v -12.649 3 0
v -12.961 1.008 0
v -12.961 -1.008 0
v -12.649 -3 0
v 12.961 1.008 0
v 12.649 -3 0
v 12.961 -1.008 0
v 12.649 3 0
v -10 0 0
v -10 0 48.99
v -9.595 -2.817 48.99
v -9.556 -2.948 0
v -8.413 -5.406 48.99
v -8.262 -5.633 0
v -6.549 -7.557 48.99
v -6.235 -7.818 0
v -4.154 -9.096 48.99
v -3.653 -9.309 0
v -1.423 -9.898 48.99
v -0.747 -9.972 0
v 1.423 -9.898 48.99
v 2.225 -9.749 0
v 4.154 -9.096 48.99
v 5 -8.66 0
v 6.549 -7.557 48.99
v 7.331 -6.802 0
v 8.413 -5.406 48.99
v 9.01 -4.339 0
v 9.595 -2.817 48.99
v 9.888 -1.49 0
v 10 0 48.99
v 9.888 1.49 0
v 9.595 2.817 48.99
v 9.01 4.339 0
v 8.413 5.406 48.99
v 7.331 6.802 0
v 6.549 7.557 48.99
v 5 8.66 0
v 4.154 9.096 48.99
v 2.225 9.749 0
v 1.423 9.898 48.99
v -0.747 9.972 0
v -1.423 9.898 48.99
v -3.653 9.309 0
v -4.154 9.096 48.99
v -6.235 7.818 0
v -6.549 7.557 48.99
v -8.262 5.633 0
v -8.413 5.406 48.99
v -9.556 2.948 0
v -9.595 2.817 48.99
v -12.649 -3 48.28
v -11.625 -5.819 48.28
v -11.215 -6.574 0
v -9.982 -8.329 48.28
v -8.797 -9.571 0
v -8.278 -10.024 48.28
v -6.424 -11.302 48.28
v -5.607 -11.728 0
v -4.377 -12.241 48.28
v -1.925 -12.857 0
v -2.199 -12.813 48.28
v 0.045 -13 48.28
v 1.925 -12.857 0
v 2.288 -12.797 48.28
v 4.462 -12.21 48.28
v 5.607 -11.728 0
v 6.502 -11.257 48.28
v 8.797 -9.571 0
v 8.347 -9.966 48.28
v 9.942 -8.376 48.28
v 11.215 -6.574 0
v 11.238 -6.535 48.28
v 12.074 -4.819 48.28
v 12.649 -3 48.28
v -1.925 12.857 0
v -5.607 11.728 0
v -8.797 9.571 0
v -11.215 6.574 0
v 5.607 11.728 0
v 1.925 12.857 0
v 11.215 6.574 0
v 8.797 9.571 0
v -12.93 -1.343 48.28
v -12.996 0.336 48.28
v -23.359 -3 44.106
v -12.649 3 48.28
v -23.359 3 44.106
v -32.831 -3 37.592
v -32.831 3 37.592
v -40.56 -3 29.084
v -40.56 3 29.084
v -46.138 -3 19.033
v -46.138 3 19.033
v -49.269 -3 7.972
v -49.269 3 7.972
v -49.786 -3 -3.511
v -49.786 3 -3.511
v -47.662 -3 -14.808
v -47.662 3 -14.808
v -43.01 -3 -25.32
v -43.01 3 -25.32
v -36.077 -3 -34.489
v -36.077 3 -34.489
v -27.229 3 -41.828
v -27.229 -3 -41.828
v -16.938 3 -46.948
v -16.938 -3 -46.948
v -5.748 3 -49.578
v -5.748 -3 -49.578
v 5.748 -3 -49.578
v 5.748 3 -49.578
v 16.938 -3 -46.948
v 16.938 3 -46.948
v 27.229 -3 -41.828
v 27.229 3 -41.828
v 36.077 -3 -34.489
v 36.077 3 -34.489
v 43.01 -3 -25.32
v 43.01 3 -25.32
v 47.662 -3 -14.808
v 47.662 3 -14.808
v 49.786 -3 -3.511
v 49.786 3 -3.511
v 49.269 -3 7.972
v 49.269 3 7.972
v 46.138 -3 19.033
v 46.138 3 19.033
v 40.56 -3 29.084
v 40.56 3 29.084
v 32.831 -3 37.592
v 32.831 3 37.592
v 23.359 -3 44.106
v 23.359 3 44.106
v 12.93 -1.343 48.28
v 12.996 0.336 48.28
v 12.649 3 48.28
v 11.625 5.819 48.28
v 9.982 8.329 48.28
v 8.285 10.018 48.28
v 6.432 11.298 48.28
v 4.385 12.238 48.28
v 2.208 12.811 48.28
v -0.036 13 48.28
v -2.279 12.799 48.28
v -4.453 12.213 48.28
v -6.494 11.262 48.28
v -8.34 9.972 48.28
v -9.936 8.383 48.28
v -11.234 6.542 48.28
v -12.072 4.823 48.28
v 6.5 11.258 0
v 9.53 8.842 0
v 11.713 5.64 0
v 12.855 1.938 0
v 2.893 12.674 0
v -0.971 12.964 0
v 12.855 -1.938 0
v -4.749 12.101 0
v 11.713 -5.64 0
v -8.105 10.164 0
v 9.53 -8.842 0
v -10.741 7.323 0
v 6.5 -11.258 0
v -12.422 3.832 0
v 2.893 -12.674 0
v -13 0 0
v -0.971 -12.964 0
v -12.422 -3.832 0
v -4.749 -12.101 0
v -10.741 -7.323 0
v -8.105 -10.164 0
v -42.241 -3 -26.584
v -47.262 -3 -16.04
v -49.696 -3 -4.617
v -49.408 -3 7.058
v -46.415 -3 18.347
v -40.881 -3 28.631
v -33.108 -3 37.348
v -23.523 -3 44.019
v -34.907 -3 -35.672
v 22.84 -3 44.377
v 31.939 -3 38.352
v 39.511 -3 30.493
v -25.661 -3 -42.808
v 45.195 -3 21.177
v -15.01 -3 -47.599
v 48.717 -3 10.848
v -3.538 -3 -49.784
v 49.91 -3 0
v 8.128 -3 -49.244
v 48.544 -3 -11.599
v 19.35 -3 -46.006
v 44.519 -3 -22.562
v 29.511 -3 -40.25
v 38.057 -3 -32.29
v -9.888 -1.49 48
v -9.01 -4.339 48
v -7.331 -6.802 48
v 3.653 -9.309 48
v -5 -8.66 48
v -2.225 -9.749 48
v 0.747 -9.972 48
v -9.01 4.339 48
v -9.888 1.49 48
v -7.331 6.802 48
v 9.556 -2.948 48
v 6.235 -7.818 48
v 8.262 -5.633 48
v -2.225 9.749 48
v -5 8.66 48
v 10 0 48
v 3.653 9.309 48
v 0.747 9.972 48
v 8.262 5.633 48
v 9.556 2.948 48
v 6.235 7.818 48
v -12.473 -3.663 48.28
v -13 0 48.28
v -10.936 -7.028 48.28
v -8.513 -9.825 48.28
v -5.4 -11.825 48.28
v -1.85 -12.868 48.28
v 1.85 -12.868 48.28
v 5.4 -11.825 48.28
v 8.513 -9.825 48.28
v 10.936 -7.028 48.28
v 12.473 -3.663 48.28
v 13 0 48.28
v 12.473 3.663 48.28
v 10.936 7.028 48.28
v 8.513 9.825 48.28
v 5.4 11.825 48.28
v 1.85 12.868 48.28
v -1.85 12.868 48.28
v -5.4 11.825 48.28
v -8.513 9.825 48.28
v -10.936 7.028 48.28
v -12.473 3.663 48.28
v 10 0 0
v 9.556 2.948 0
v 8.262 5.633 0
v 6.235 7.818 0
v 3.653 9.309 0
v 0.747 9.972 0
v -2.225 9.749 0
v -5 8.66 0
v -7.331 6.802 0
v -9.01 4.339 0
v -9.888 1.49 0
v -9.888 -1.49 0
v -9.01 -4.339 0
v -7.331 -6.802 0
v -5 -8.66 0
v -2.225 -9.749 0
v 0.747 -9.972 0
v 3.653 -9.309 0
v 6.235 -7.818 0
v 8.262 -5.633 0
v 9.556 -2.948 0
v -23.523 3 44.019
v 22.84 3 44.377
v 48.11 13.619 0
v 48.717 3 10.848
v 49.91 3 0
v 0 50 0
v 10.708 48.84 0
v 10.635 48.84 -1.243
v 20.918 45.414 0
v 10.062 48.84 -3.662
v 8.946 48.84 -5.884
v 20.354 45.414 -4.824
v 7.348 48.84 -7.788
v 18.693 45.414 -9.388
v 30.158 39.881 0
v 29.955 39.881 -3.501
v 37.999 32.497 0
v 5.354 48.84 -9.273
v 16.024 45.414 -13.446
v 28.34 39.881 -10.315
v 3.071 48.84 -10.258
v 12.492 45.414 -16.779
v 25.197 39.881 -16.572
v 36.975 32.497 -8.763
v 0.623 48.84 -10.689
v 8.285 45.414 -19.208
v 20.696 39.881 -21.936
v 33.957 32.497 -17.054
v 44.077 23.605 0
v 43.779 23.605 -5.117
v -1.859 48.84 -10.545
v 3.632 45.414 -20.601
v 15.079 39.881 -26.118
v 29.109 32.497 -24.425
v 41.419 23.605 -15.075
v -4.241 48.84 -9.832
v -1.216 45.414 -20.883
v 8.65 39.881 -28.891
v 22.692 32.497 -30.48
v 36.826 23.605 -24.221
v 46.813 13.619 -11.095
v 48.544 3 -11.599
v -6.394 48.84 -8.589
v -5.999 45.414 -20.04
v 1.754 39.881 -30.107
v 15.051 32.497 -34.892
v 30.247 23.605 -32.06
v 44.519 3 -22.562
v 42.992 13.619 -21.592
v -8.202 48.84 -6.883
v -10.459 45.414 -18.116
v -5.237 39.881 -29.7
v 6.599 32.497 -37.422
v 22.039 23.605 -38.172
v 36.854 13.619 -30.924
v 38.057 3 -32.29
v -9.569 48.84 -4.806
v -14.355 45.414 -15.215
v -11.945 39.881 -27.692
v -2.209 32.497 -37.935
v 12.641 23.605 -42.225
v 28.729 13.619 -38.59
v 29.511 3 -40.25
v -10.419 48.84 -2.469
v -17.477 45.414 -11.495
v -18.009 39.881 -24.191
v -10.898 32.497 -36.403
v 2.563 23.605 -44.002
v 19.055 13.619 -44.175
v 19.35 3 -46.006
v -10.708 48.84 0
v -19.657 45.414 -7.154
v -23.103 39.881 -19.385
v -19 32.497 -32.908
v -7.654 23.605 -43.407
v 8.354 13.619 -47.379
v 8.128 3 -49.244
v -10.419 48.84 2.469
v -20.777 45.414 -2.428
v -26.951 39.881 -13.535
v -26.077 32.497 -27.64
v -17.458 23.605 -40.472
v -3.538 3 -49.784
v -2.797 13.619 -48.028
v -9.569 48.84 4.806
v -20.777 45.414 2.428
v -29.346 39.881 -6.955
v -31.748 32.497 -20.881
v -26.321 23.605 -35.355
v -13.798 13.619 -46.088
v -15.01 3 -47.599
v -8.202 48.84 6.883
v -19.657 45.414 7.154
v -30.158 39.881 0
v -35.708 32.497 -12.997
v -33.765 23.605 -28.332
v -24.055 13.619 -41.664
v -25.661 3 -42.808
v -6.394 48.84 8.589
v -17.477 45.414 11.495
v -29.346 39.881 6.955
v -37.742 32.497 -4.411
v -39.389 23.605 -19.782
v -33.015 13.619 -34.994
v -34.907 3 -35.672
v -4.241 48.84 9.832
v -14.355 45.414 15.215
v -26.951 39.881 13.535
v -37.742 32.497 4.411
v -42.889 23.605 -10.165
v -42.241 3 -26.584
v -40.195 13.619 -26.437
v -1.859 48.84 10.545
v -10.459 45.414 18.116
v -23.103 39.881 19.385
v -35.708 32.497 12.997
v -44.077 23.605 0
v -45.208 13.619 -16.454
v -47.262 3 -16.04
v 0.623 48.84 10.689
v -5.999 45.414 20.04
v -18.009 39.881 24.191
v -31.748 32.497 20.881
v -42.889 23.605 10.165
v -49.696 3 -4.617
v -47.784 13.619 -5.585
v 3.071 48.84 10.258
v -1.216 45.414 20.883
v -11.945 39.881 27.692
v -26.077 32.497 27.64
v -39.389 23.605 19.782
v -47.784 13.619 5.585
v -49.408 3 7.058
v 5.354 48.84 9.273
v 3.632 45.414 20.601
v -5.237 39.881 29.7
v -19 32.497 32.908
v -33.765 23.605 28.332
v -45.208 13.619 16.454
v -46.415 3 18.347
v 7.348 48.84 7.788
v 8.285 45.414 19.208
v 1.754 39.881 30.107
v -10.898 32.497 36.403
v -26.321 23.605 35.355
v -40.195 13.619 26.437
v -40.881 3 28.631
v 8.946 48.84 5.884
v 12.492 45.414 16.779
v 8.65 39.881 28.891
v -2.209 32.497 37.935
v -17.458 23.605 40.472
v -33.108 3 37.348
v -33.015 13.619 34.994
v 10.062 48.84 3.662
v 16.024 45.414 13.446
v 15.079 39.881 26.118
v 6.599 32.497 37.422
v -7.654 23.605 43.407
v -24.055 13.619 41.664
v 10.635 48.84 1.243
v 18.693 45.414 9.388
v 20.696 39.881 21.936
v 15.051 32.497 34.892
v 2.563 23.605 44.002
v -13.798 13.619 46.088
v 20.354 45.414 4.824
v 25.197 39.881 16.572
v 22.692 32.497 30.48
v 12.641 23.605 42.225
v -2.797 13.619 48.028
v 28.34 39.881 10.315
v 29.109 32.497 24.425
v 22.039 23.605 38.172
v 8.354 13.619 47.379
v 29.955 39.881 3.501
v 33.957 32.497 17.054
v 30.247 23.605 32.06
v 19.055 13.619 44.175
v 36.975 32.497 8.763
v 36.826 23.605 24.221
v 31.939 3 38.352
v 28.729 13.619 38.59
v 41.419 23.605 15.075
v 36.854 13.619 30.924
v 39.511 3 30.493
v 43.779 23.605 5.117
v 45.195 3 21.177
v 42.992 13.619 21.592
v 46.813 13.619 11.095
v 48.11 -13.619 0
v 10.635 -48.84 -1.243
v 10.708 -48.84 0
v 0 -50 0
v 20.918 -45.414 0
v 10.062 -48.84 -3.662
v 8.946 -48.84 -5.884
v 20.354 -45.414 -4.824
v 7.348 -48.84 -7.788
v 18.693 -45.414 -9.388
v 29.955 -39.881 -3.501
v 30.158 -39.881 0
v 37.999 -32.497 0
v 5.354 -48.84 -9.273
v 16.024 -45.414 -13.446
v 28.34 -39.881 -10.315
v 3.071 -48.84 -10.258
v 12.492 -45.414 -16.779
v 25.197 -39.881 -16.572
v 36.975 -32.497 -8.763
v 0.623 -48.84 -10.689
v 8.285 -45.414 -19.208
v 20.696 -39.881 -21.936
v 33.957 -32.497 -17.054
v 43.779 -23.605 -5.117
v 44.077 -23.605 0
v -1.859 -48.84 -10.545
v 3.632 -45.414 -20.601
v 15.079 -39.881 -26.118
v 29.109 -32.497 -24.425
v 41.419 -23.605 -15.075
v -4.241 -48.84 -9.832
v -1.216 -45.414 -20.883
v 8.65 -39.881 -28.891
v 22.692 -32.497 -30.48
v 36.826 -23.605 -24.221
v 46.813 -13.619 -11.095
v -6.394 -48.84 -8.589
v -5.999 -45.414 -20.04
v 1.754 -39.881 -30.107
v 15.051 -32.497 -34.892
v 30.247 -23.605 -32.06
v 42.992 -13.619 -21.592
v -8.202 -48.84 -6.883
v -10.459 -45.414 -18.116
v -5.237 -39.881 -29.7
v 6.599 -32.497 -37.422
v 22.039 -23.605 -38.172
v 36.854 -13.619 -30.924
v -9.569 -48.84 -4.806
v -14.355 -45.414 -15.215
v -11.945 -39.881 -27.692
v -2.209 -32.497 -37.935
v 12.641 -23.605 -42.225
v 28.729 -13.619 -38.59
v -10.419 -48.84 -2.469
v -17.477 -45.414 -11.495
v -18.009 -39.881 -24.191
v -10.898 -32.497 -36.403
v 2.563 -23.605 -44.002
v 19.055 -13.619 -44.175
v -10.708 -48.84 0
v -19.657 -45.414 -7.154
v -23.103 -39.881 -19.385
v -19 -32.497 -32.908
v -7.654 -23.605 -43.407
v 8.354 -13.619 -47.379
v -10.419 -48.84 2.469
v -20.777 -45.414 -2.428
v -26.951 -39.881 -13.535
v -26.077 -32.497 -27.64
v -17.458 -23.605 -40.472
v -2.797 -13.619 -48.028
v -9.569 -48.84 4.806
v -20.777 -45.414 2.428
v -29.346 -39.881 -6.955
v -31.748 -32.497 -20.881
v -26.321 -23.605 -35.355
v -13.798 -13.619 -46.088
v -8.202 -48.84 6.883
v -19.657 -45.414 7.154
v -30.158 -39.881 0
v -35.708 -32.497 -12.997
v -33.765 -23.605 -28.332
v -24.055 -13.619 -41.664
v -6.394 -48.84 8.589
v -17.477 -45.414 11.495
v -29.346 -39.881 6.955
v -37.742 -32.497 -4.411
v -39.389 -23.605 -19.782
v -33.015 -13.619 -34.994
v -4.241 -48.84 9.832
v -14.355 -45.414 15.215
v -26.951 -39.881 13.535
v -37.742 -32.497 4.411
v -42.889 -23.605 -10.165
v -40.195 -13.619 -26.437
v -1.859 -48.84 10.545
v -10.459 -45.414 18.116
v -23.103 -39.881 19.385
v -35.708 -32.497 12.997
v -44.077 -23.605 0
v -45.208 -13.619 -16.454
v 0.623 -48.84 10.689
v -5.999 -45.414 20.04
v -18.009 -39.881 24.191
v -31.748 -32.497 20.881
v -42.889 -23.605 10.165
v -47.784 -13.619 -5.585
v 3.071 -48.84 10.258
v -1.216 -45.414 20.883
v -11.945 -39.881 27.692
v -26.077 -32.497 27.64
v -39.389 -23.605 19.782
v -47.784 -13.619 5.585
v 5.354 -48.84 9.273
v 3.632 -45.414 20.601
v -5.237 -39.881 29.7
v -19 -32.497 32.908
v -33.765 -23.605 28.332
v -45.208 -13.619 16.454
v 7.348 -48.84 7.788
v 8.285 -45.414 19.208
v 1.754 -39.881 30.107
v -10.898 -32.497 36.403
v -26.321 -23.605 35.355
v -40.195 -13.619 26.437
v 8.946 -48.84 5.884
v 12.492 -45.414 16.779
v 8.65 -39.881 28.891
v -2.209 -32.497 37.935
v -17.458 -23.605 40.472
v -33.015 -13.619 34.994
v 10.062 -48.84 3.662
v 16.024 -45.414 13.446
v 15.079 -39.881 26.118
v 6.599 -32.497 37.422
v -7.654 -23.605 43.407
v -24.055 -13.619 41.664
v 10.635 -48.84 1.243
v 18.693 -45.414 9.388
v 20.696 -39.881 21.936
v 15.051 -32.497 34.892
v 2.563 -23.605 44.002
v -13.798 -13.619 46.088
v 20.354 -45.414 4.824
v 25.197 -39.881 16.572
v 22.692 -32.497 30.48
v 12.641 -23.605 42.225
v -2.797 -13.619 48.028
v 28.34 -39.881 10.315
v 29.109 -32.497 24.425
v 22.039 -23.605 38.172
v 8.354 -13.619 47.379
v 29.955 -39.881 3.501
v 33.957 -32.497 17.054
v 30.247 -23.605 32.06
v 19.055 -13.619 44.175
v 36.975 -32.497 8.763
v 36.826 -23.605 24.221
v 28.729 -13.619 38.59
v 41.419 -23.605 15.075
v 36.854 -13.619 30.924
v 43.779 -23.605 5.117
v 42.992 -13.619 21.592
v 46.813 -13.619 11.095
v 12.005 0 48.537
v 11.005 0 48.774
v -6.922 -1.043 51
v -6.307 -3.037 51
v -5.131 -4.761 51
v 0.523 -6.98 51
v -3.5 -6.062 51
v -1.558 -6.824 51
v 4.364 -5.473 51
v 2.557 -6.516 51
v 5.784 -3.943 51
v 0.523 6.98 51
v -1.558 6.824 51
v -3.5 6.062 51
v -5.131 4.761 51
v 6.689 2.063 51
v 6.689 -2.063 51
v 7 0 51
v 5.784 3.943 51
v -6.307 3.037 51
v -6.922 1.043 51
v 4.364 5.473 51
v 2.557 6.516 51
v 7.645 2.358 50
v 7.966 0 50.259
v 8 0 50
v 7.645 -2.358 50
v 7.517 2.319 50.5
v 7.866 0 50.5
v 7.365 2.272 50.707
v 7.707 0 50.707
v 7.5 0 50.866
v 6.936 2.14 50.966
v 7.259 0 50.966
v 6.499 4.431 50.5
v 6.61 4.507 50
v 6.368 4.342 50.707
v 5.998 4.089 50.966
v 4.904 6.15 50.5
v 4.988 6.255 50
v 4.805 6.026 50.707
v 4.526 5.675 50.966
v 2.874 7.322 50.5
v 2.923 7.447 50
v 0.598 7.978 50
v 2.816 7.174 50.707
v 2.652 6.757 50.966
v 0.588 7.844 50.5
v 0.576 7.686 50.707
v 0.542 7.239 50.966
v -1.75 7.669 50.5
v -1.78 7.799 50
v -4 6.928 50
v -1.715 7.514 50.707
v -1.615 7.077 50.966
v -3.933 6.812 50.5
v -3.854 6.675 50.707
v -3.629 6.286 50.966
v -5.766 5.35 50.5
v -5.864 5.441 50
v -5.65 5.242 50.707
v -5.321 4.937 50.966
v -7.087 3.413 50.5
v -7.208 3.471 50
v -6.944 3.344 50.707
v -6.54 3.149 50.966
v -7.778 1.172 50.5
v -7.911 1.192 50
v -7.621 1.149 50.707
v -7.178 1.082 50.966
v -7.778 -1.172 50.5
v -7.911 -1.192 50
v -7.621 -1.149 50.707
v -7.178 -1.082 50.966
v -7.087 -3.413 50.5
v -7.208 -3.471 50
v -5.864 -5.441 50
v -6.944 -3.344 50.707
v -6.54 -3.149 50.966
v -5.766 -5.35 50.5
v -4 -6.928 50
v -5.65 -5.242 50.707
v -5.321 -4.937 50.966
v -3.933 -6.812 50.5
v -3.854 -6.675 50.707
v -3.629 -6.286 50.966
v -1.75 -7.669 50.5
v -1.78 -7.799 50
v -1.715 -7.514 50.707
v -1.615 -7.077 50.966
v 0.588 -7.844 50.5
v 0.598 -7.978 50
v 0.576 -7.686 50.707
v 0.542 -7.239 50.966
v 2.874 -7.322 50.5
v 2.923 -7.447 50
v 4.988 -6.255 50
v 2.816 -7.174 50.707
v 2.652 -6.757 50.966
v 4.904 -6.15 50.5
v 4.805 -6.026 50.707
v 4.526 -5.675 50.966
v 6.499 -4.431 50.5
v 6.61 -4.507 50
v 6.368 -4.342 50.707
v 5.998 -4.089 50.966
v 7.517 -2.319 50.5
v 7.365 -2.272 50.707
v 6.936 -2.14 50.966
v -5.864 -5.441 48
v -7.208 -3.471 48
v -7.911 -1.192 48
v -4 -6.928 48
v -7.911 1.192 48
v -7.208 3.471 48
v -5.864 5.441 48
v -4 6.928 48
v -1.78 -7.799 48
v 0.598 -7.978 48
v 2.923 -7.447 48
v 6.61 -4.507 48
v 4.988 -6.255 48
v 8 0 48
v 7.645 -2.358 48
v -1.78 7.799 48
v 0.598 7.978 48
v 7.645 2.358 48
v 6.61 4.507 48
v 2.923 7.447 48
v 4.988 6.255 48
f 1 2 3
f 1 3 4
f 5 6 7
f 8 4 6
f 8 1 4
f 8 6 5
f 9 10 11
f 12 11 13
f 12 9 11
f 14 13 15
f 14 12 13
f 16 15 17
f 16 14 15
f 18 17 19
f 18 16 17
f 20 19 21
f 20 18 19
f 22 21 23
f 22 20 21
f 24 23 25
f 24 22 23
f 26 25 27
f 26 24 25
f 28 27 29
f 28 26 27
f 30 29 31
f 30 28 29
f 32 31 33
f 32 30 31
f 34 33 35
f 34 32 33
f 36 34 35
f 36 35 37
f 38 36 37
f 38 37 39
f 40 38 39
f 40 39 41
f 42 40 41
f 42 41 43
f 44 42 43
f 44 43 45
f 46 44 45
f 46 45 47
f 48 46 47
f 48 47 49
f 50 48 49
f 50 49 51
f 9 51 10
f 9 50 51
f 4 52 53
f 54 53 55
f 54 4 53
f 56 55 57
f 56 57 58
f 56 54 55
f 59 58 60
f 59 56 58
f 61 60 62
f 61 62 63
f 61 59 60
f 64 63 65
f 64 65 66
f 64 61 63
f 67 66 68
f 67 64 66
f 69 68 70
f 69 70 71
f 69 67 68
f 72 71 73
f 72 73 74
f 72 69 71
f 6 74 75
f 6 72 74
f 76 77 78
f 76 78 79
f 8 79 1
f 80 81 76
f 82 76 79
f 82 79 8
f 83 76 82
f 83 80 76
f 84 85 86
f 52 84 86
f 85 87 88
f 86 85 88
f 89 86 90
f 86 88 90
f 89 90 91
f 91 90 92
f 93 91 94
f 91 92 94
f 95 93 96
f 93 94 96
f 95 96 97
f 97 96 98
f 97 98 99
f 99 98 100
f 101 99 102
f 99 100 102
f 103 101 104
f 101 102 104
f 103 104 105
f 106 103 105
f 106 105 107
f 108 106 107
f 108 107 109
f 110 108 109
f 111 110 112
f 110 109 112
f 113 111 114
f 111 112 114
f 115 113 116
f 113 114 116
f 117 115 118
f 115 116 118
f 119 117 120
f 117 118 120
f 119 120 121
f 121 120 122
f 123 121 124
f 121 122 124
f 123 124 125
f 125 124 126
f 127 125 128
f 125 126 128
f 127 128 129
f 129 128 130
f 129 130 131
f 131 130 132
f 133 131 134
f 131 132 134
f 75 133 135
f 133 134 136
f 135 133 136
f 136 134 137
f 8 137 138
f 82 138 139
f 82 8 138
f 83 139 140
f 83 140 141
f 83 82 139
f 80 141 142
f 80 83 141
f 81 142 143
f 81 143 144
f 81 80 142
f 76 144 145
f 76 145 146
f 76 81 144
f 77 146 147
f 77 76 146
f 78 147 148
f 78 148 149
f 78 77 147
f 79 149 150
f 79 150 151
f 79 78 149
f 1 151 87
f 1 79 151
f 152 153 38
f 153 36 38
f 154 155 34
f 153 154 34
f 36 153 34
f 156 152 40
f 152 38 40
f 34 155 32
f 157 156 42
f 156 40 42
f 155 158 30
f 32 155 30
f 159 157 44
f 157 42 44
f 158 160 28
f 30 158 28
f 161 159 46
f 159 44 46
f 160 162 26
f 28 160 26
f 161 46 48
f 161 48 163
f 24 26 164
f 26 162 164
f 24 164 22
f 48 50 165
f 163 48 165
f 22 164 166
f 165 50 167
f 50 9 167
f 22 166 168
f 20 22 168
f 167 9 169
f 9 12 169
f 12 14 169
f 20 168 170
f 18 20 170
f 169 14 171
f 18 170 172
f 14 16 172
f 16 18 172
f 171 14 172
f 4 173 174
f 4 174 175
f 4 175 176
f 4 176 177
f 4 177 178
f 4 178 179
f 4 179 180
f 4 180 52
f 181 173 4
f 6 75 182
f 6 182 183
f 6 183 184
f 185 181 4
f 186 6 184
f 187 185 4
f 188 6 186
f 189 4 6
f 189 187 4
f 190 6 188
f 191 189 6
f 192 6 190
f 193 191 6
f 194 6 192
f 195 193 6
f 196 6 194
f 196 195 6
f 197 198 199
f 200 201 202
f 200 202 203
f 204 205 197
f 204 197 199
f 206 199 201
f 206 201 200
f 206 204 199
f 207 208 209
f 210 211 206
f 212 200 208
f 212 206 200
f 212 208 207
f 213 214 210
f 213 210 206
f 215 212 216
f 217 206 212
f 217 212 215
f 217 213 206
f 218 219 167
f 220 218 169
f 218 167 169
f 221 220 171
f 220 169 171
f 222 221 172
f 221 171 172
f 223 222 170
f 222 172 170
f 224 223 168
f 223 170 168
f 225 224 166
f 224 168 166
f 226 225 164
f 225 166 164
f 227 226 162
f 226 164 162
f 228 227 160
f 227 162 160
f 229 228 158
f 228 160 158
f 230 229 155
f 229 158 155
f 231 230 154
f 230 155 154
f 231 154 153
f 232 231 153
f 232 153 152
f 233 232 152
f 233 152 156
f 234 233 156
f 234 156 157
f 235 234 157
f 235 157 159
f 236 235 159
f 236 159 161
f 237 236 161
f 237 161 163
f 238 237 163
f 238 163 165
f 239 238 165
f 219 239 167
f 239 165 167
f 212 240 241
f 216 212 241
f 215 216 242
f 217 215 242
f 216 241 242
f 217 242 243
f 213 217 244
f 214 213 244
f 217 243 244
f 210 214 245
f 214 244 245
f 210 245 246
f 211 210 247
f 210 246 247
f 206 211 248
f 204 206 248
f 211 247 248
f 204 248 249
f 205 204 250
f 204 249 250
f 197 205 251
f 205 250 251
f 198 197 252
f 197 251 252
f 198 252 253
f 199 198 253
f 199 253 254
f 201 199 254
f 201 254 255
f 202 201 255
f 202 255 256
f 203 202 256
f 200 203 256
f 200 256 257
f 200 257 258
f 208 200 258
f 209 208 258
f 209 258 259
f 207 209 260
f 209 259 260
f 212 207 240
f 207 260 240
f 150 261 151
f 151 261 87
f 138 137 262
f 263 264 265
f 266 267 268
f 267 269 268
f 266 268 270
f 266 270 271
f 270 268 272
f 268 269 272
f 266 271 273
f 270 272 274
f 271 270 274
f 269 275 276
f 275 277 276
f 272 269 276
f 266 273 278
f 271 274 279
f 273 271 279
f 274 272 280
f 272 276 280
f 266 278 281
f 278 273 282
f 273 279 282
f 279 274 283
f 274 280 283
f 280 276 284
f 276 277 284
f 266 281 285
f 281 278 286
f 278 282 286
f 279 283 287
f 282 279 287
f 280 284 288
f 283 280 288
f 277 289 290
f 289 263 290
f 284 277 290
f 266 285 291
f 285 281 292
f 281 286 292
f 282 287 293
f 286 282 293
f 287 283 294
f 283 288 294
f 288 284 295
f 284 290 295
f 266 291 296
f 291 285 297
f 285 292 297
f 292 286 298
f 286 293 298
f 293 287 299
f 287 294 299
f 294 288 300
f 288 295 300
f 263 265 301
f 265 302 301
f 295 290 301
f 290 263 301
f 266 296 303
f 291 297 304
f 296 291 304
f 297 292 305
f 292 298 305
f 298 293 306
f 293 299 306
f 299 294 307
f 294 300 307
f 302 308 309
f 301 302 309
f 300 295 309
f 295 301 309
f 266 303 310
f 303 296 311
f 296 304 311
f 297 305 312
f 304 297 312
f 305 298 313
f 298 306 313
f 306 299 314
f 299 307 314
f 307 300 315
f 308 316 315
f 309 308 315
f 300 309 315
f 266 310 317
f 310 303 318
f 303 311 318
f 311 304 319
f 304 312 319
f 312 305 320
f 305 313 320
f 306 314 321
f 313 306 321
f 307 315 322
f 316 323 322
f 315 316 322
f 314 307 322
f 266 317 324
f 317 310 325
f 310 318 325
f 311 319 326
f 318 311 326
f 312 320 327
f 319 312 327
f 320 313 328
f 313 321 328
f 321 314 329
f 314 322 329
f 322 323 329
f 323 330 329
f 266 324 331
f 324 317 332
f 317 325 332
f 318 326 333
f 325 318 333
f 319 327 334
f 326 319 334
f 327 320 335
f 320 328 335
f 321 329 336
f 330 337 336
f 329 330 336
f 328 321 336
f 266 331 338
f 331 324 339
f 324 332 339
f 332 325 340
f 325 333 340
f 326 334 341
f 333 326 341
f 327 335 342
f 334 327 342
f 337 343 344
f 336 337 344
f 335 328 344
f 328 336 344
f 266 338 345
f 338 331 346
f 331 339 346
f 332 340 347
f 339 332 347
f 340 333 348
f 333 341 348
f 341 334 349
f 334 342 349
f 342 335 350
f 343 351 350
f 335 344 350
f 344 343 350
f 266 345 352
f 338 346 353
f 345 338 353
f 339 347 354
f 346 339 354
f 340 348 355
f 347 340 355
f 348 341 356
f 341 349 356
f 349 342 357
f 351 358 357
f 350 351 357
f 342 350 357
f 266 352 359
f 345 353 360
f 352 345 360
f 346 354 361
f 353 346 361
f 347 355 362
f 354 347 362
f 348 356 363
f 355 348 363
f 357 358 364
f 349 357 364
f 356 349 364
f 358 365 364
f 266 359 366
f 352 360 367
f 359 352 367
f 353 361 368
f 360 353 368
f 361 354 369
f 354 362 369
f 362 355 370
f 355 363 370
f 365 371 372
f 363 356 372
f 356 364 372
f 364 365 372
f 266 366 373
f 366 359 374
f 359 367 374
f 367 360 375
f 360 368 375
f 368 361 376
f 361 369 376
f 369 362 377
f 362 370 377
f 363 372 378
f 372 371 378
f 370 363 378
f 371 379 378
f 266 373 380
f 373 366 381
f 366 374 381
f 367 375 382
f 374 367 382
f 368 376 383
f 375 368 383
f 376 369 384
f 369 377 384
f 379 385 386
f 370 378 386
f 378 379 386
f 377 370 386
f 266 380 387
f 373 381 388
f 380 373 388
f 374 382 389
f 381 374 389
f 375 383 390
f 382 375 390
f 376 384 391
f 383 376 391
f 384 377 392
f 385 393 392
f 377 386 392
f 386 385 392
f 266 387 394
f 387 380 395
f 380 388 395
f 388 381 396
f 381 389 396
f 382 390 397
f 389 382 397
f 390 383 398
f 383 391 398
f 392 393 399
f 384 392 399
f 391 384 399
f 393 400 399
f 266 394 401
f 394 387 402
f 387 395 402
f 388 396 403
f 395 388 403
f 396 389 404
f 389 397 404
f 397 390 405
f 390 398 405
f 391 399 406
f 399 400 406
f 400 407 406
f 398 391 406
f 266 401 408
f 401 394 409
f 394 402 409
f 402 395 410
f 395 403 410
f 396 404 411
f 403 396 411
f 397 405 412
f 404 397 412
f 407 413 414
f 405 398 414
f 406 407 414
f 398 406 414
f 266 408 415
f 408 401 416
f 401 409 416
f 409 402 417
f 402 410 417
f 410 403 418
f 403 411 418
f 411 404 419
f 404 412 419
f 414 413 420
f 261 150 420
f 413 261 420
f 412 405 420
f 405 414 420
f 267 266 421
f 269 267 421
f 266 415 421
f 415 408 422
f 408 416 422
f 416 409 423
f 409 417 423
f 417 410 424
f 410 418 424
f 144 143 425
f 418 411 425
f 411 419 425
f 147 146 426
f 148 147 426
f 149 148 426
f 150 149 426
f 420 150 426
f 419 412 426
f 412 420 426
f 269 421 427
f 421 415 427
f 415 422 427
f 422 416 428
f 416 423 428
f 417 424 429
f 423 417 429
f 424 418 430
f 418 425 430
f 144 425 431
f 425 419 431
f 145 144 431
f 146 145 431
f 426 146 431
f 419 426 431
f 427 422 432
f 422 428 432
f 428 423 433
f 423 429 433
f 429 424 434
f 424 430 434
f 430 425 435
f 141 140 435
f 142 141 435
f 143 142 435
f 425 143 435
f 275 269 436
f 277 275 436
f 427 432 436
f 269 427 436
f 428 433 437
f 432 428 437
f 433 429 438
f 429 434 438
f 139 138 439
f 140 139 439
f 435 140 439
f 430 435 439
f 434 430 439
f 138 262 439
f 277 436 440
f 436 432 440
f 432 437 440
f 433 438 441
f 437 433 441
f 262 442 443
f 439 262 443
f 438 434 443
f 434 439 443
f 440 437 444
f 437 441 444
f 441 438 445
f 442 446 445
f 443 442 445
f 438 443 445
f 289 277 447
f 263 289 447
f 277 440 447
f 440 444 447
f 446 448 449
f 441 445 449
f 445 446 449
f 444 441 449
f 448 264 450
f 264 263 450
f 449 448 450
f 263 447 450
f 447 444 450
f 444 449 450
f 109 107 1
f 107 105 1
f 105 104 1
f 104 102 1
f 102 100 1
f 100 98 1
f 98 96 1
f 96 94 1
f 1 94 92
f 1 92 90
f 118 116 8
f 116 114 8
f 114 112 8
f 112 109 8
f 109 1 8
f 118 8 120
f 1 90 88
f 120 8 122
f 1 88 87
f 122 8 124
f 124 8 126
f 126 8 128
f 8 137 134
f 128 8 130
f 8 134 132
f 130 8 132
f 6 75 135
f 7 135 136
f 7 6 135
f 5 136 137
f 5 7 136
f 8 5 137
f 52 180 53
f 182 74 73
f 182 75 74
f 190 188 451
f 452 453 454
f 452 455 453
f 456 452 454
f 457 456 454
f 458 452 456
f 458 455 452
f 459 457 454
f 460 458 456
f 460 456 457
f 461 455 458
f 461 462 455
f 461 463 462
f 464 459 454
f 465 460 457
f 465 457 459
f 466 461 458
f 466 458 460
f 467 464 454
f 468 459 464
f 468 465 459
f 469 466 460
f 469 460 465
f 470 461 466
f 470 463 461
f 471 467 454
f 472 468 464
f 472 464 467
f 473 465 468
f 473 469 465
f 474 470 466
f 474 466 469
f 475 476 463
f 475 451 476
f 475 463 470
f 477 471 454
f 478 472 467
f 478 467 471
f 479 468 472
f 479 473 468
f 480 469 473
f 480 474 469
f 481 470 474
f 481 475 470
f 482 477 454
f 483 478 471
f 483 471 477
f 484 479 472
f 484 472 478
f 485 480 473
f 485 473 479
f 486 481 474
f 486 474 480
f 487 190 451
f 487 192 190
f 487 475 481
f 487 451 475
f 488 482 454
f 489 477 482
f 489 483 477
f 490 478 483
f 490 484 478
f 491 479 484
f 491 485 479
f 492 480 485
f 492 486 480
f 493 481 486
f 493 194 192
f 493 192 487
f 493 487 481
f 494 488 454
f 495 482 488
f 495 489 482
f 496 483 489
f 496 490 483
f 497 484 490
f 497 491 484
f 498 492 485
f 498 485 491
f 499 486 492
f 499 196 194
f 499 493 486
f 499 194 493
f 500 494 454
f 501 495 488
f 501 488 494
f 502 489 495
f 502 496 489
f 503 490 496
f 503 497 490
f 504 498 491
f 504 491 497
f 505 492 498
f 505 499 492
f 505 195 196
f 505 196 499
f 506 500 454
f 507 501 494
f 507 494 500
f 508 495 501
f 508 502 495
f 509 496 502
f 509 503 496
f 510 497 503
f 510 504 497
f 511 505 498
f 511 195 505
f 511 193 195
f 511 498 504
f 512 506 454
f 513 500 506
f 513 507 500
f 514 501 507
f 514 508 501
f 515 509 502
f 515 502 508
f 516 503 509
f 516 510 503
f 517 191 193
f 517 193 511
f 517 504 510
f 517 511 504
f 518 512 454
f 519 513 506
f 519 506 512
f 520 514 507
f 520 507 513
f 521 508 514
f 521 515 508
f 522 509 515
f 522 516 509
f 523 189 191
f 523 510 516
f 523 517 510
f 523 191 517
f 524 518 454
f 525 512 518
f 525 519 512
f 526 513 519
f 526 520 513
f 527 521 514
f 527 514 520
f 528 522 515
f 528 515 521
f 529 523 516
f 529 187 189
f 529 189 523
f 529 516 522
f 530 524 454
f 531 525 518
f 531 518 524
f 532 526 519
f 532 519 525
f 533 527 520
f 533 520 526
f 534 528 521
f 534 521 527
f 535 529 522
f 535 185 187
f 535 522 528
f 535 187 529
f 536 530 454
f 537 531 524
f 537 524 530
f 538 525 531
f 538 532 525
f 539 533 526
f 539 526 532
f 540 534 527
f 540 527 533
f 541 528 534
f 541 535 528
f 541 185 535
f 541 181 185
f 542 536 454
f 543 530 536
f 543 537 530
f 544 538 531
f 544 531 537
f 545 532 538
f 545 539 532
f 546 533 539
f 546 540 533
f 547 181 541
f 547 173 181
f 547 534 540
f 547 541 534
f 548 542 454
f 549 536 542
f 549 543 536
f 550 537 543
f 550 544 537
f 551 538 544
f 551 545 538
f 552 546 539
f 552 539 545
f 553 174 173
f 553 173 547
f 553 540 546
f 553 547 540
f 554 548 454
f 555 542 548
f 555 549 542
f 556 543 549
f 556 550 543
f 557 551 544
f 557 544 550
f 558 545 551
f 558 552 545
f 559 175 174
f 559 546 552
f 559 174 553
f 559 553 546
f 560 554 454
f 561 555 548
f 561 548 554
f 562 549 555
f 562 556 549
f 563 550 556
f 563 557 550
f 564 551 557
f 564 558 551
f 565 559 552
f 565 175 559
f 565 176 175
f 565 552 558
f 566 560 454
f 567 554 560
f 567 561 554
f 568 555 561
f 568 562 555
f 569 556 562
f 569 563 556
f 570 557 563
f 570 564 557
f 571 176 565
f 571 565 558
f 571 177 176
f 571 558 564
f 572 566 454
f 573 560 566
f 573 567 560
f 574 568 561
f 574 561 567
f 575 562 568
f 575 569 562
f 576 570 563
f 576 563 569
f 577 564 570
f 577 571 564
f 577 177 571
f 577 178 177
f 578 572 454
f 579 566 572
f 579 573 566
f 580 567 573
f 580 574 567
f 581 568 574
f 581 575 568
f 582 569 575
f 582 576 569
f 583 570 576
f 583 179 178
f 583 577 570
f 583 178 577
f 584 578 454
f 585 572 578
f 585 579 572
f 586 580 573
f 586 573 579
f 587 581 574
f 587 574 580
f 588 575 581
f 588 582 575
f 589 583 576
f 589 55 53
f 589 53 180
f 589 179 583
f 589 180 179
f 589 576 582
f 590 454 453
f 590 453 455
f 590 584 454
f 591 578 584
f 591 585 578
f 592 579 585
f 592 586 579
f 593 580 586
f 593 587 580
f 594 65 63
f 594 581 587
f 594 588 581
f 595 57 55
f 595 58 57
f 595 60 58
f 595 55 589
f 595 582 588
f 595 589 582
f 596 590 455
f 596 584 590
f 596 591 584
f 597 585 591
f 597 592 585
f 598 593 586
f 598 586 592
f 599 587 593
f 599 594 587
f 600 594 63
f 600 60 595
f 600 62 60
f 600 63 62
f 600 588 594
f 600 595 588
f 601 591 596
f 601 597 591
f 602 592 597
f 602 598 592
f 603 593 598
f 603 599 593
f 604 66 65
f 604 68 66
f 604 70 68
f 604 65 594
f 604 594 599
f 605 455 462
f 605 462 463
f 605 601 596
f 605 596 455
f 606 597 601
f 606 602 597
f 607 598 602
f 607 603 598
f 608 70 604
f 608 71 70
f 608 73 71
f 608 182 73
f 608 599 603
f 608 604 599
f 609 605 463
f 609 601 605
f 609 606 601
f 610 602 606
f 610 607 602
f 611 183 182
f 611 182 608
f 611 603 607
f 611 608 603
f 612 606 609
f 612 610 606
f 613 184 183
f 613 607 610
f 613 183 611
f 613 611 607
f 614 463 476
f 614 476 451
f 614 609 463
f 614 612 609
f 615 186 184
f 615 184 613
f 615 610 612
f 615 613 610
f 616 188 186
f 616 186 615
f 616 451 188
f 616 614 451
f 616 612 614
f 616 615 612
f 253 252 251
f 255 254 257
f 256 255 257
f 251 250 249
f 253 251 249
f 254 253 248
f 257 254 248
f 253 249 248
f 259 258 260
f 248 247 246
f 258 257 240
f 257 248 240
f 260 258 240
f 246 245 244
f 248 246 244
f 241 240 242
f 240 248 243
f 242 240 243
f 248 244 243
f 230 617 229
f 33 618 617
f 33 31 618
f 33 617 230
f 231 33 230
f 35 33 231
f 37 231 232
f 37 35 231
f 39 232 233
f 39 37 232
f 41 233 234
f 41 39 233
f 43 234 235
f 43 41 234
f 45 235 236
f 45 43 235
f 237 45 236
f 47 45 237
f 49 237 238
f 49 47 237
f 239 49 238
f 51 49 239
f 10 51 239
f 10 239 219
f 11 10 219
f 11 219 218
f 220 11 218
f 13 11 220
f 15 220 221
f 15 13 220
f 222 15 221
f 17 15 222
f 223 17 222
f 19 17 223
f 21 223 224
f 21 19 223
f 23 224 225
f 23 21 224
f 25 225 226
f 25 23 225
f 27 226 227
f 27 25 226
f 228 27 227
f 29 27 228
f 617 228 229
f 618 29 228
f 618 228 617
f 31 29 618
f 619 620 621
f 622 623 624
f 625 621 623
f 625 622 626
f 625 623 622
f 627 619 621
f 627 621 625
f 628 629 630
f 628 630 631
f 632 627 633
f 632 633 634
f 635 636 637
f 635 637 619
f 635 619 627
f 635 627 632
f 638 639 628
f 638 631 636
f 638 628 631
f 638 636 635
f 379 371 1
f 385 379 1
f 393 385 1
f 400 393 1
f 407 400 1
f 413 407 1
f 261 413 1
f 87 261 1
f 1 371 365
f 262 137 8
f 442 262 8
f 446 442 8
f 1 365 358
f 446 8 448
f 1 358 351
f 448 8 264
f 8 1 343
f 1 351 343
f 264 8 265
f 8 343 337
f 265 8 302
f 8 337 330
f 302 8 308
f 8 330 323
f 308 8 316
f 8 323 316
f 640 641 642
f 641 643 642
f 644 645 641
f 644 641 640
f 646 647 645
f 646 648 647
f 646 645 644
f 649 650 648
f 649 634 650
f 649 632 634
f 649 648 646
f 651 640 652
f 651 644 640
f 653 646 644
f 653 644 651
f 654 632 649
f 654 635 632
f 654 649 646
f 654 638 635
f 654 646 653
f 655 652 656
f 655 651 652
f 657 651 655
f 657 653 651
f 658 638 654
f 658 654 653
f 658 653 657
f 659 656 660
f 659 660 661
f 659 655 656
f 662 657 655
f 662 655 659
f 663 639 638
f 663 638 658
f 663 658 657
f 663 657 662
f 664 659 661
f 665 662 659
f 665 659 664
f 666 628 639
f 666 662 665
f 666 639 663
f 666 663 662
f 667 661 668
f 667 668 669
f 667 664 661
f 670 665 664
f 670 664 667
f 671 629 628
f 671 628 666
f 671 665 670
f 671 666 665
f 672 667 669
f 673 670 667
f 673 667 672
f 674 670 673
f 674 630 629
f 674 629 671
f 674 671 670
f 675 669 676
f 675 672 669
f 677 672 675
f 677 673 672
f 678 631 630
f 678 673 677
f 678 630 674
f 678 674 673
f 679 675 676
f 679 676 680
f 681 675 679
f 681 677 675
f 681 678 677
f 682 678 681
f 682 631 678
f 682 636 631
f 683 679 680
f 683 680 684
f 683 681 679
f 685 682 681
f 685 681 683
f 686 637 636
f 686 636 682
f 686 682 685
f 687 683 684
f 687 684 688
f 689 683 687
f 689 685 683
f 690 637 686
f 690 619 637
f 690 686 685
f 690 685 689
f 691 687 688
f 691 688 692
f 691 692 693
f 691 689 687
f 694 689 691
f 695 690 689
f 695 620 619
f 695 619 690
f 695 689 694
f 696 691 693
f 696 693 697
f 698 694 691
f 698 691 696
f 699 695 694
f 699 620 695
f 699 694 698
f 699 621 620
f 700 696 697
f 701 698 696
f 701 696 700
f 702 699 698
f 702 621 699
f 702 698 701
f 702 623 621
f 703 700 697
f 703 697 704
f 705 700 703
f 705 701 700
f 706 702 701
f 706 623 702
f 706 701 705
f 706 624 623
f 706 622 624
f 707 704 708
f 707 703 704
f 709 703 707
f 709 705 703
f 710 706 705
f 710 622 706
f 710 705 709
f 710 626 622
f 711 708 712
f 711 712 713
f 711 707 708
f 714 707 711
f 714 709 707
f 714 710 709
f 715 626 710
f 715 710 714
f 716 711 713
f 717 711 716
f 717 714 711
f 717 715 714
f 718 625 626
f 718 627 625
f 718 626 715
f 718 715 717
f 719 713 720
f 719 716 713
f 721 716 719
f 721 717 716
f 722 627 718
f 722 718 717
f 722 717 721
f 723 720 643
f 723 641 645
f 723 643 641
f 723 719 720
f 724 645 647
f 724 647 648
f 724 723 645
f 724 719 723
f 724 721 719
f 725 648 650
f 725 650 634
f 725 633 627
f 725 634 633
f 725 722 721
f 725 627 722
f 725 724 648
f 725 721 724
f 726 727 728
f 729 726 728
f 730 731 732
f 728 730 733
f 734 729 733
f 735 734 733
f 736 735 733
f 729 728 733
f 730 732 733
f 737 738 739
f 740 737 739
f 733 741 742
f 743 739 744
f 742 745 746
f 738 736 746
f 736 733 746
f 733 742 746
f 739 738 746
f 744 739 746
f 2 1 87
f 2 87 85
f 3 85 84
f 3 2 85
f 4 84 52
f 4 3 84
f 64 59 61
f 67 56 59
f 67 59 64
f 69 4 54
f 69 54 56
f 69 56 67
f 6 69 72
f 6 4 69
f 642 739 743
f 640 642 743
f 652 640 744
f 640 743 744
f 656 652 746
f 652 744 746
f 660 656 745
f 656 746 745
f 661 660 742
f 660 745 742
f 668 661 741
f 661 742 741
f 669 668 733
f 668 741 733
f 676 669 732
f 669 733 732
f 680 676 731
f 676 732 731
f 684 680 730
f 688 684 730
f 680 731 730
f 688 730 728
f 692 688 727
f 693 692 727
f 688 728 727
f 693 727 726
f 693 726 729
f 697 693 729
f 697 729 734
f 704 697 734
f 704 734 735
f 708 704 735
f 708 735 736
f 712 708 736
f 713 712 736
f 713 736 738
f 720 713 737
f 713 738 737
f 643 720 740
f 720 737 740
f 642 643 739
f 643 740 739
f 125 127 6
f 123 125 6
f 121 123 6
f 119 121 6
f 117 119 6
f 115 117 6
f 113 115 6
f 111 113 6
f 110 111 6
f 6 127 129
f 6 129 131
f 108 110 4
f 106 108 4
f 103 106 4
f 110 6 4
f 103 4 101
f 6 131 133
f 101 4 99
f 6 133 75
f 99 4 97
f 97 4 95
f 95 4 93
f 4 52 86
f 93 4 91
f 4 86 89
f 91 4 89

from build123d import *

# Parameters (mm, degrees)
SKETCH4_R                = 13
CUT_EXTRUDE1_DEPTH       = 70
BOSS_EXTRUDE2_REACH      = 88.603
BOSS_EXTRUDE2_END_RADIUS = 50
SKETCH5_R                = 13
SKETCH6_R                = 10
CUT_EXTRUDE2_DEPTH       = 70
SKETCH7_R                = 10
BOSS_EXTRUDE4_DEPTH      = 48
SKETCH8_R                = 8
BOSS_EXTRUDE6_DEPTH      = 3
FILLET1_R                = 1


with BuildPart() as part:
    # Sketch1 → Revolve1 (revolve)
    with BuildSketch(Plane.XY):
        with BuildLine():
            Line((49.909918854, 3), (0, 3))
            Line((0, 3), (0, 50))
            ThreePointArc((0, 50), (34.278273002, 36.400549446), (49.909918854, 3))
        make_face()
        with BuildLine():
            Line((49.909918854, -3), (0, -3))
            Line((0, -3), (0, -50))
            ThreePointArc((0, -50), (34.278273002, -36.400549446), (49.909918854, -3))
        make_face()
    revolve(axis=Axis((0, -3, 0), (0, 1, 0)))


with BuildPart() as body_2:
    # Sketch3 → Revolve2 (revolve)
    with BuildSketch(Plane.XY):
        with BuildLine():
            Line((49.909918854, 3), (0, 3))
            Line((0, 3), (0, -3))
            Line((0, -3), (49.909918854, -3))
            ThreePointArc((49.909918854, -3), (50, 0), (49.909918854, 3))
        make_face()
    revolve(axis=Axis((0, 3, 0), (0, -1, 0)))


with BuildPart() as cut_extrude1_tool:
    # Sketch4 → Cut-Extrude1 (new body)
    with BuildSketch(Plane.XY):
        Circle(SKETCH4_R)
    extrude(amount=CUT_EXTRUDE1_DEPTH)


with BuildPart() as part_1:
    add(part.part)

    # Cut-Extrude1: cut by cut_extrude1_tool
    add(cut_extrude1_tool.part, mode=Mode.SUBTRACT)


with BuildPart() as body_2_1:
    add(body_2.part)

    # Cut-Extrude1: cut by cut_extrude1_tool
    add(cut_extrude1_tool.part, mode=Mode.SUBTRACT)


with BuildPart() as body_3:
    # Boss-Extrude2: up to this sphere (the profile starts inside it)
    boss_extrude2_end = Location((0, 0, 0)) * Sphere(BOSS_EXTRUDE2_END_RADIUS, mode=Mode.PRIVATE)
    # Sketch5 → Boss-Extrude2 (new, up to the surface)
    with BuildSketch(Plane.XY, mode=Mode.PRIVATE) as boss_extrude2_sk1:
        with Locations(Location((0, 0, 0), (0, 0, 180))):
            Circle(SKETCH5_R)
    boss_extrude2_tool1 = extrude(boss_extrude2_sk1.sketch, amount=BOSS_EXTRUDE2_REACH, mode=Mode.PRIVATE) & boss_extrude2_end
    add(boss_extrude2_tool1.solids().sort_by_distance((0, 0, 0))[0])

    # Sketch6 → Cut-Extrude2 (cut)
    with BuildSketch(Plane.XY):
        with Locations(Location((0, 0, 0), (0, 0, 180))):
            Circle(SKETCH6_R)
    extrude(amount=CUT_EXTRUDE2_DEPTH, mode=Mode.SUBTRACT)


with BuildPart() as body_4:
    # Sketch7 → Boss-Extrude4 (new body)
    with BuildSketch(Plane.XY):
        Circle(SKETCH7_R)
    extrude(amount=BOSS_EXTRUDE4_DEPTH)


with BuildPart() as body_5:
    # Sketch8 → Boss-Extrude6 (new body)
    with BuildSketch(Plane.XY.offset(48)):
        Circle(SKETCH8_R)
    extrude(amount=BOSS_EXTRUDE6_DEPTH)

    # Fillet1
    fillet1_edges = [body_5.edges().sort_by_distance(p)[0] for p in [
        (-8, 0, 51),
    ]]
    fillet(fillet1_edges, radius=FILLET1_R)


solid = Compound([part_1.part, body_2_1.part, body_3.part, body_4.part, body_5.part])
